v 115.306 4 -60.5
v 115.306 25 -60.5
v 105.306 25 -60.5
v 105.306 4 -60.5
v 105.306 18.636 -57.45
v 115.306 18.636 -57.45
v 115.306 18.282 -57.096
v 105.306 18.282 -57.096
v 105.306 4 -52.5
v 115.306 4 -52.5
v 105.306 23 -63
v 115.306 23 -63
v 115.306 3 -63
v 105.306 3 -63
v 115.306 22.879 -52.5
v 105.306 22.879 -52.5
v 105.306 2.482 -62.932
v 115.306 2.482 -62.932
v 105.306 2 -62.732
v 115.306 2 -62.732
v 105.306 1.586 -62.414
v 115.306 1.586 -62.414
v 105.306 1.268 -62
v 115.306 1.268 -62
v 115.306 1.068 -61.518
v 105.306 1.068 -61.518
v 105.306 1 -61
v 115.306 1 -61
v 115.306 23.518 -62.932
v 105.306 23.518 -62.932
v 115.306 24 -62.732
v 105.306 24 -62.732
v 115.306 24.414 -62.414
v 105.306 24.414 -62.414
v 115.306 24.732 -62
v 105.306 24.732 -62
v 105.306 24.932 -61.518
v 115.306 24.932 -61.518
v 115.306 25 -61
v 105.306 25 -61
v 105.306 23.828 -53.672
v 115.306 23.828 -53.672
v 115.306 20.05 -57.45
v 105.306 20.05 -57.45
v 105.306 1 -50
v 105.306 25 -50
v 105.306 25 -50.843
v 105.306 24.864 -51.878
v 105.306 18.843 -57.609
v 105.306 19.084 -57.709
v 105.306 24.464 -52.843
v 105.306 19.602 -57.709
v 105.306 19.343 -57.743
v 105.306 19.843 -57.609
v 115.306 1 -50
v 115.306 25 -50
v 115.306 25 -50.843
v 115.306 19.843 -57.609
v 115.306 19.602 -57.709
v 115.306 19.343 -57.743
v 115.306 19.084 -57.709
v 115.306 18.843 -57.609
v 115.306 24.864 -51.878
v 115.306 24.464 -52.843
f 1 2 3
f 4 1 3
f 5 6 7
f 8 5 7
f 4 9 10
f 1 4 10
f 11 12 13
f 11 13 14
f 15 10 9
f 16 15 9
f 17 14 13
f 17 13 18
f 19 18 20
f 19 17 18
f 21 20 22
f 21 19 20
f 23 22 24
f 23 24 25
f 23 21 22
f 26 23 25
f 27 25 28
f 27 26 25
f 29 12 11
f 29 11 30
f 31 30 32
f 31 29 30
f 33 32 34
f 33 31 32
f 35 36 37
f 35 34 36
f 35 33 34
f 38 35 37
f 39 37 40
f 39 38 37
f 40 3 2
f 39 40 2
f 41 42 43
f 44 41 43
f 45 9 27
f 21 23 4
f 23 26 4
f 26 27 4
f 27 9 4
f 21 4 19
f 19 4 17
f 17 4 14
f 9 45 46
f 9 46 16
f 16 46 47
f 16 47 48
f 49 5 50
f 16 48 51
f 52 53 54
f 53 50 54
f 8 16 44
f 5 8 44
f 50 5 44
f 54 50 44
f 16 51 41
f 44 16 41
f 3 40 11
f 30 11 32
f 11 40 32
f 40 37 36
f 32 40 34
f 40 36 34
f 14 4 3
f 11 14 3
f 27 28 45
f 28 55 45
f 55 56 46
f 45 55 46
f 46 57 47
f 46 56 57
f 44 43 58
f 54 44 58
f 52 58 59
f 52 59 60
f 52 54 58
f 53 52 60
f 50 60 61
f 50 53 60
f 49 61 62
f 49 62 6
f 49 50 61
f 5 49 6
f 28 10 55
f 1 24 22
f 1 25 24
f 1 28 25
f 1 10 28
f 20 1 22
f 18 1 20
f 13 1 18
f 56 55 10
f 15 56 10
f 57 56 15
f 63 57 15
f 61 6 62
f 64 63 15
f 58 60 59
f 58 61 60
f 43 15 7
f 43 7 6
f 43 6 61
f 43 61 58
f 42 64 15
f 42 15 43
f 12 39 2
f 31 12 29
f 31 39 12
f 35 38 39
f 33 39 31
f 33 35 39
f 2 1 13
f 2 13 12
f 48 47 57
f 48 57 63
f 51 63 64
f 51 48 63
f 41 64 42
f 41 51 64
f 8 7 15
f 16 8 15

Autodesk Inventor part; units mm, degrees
ref_plane "YZ Plane" through (0, 0, 0) normal (1, 0, 0) x (0, 1, 0)
ref_plane "XZ Plane" through (0, 0, 0) normal (0, 1, 0) x (-1, 0, 0)
ref_plane "XY Plane" through (0, 0, 0) normal (0, 0, 1) x (1, 0, 0)
ref_plane "Work Plane1" through (150, 0, -50) normal (0, 0, -1) x (-1, 0, 0)
sketch "Sketch1" plane through (150, 0, -50) normal (0, 0, -1) x (-1, 0, 0)
  line L0 (-107, 15) -> (222, 15)
  line L1 (44.694, 5) -> (34.694, 5)
  line L2 (34.694, 5) -> (34.694, 25)
  line L3 (34.694, 25) -> (44.694, 25)
  line L4 (44.694, 25) -> (44.694, 5)
  line L5 (44.694, 5) -> (34.694, 25) construction
  line L6 (34.694, 5) -> (44.694, 25) construction
  line L7 (34.694, 5) -> (44.694, 5)
  line L8 (44.694, 5) -> (44.694, 1)
  line L9 (44.694, 1) -> (34.694, 1)
  line L10 (34.694, 1) -> (34.694, 5)
  point P0 (150, 0)
  point P1 (39.694, 15)
  dimension "d0" = 20
  dimension "d1" = 10
  dimension "d2" = 177.306
  dimension "d3" = 4
extrude "Extrusion1" add sketch "Sketch1" along normal blind 2.5
sketch "Sketch2" plane through (150, 0, -52.5) normal (0, 0, -1) x (-1, 0, 0)
  line L0 (34.694, 25) -> (34.694, 1) projected
  line L1 (34.694, 1) -> (44.694, 1) projected
  line L2 (44.694, 1) -> (44.694, 25) projected
  line L3 (44.694, 25) -> (34.694, 25) projected
  line L4 (34.694, 1) -> (44.694, 1)
  line L5 (44.694, 1) -> (44.694, 4)
  line L6 (44.694, 4) -> (34.694, 4)
  line L7 (34.694, 4) -> (34.694, 1)
  point P0 (150, 0)
  dimension "d6" = 3
extrude "Extrusion2" add sketch "Sketch2" along normal blind 8 contours L6 L2 L1 L0
sketch "Sketch3" plane through (150, 0, -60.5) normal (0, 0, -1) x (-1, 0, 0)
  line L0 (34.694, 4) -> (34.694, 1) projected
  line L1 (34.694, 1) -> (44.694, 1) projected
  line L2 (44.694, 1) -> (44.694, 4) projected
  line L3 (44.694, 4) -> (34.694, 4) projected
  line L4 (-107, 15) -> (222, 15)
  line L5 (34.694, 4) -> (44.694, 4) projected
  line L6 (44.694, 4) -> (44.694, 25) projected
  line L7 (44.694, 25) -> (34.694, 25) projected
  line L8 (34.694, 25) -> (34.694, 4) projected
  line L9 (34.694, 25) -> (44.694, 25)
  line L10 (44.694, 25) -> (44.694, 1)
  line L11 (44.694, 1) -> (34.694, 1)
  line L12 (34.694, 1) -> (34.694, 25)
  point P0 (150, 0)
extrude "Extrusion3" add sketch "Sketch3" along normal blind 2.5
sketch "Sketch4" plane through (115.306, 1, -50) normal (1, 0, 0) x (0, 0, -1)
  line L0 (2.5, 3) -> (2.5, 24) projected
  line L1 (2.5, 24) -> (8.1569, 18.3431)
  line L2 (2.5, 24) -> (10.5, 24) construction
  line L3 (8.1569, 18.3431) -> (7.0962, 17.2825)
  line L4 (7.0962, 17.2825) -> (2.5, 21.8787)
  point P0 (-50, -1)
  dimension "d11" = 8
  dimension "d12" = 45
  dimension "d13" = 1.5
extrude "Extrusion4" add sketch "Sketch4" against normal up to surface (10 mm away)
fillet "Fillet1" radius 2 2 edges at (110.306, 25, -63) (110.306, 1, -63)
fillet "Fillet2" radius 4 1 edges at (110.306, 25, -52.5)
fillet "Fillet3" radius 1 1 edges at (110.306, 19.3431, -58.1569)
properties part number "cable-clip_3DPrint"
